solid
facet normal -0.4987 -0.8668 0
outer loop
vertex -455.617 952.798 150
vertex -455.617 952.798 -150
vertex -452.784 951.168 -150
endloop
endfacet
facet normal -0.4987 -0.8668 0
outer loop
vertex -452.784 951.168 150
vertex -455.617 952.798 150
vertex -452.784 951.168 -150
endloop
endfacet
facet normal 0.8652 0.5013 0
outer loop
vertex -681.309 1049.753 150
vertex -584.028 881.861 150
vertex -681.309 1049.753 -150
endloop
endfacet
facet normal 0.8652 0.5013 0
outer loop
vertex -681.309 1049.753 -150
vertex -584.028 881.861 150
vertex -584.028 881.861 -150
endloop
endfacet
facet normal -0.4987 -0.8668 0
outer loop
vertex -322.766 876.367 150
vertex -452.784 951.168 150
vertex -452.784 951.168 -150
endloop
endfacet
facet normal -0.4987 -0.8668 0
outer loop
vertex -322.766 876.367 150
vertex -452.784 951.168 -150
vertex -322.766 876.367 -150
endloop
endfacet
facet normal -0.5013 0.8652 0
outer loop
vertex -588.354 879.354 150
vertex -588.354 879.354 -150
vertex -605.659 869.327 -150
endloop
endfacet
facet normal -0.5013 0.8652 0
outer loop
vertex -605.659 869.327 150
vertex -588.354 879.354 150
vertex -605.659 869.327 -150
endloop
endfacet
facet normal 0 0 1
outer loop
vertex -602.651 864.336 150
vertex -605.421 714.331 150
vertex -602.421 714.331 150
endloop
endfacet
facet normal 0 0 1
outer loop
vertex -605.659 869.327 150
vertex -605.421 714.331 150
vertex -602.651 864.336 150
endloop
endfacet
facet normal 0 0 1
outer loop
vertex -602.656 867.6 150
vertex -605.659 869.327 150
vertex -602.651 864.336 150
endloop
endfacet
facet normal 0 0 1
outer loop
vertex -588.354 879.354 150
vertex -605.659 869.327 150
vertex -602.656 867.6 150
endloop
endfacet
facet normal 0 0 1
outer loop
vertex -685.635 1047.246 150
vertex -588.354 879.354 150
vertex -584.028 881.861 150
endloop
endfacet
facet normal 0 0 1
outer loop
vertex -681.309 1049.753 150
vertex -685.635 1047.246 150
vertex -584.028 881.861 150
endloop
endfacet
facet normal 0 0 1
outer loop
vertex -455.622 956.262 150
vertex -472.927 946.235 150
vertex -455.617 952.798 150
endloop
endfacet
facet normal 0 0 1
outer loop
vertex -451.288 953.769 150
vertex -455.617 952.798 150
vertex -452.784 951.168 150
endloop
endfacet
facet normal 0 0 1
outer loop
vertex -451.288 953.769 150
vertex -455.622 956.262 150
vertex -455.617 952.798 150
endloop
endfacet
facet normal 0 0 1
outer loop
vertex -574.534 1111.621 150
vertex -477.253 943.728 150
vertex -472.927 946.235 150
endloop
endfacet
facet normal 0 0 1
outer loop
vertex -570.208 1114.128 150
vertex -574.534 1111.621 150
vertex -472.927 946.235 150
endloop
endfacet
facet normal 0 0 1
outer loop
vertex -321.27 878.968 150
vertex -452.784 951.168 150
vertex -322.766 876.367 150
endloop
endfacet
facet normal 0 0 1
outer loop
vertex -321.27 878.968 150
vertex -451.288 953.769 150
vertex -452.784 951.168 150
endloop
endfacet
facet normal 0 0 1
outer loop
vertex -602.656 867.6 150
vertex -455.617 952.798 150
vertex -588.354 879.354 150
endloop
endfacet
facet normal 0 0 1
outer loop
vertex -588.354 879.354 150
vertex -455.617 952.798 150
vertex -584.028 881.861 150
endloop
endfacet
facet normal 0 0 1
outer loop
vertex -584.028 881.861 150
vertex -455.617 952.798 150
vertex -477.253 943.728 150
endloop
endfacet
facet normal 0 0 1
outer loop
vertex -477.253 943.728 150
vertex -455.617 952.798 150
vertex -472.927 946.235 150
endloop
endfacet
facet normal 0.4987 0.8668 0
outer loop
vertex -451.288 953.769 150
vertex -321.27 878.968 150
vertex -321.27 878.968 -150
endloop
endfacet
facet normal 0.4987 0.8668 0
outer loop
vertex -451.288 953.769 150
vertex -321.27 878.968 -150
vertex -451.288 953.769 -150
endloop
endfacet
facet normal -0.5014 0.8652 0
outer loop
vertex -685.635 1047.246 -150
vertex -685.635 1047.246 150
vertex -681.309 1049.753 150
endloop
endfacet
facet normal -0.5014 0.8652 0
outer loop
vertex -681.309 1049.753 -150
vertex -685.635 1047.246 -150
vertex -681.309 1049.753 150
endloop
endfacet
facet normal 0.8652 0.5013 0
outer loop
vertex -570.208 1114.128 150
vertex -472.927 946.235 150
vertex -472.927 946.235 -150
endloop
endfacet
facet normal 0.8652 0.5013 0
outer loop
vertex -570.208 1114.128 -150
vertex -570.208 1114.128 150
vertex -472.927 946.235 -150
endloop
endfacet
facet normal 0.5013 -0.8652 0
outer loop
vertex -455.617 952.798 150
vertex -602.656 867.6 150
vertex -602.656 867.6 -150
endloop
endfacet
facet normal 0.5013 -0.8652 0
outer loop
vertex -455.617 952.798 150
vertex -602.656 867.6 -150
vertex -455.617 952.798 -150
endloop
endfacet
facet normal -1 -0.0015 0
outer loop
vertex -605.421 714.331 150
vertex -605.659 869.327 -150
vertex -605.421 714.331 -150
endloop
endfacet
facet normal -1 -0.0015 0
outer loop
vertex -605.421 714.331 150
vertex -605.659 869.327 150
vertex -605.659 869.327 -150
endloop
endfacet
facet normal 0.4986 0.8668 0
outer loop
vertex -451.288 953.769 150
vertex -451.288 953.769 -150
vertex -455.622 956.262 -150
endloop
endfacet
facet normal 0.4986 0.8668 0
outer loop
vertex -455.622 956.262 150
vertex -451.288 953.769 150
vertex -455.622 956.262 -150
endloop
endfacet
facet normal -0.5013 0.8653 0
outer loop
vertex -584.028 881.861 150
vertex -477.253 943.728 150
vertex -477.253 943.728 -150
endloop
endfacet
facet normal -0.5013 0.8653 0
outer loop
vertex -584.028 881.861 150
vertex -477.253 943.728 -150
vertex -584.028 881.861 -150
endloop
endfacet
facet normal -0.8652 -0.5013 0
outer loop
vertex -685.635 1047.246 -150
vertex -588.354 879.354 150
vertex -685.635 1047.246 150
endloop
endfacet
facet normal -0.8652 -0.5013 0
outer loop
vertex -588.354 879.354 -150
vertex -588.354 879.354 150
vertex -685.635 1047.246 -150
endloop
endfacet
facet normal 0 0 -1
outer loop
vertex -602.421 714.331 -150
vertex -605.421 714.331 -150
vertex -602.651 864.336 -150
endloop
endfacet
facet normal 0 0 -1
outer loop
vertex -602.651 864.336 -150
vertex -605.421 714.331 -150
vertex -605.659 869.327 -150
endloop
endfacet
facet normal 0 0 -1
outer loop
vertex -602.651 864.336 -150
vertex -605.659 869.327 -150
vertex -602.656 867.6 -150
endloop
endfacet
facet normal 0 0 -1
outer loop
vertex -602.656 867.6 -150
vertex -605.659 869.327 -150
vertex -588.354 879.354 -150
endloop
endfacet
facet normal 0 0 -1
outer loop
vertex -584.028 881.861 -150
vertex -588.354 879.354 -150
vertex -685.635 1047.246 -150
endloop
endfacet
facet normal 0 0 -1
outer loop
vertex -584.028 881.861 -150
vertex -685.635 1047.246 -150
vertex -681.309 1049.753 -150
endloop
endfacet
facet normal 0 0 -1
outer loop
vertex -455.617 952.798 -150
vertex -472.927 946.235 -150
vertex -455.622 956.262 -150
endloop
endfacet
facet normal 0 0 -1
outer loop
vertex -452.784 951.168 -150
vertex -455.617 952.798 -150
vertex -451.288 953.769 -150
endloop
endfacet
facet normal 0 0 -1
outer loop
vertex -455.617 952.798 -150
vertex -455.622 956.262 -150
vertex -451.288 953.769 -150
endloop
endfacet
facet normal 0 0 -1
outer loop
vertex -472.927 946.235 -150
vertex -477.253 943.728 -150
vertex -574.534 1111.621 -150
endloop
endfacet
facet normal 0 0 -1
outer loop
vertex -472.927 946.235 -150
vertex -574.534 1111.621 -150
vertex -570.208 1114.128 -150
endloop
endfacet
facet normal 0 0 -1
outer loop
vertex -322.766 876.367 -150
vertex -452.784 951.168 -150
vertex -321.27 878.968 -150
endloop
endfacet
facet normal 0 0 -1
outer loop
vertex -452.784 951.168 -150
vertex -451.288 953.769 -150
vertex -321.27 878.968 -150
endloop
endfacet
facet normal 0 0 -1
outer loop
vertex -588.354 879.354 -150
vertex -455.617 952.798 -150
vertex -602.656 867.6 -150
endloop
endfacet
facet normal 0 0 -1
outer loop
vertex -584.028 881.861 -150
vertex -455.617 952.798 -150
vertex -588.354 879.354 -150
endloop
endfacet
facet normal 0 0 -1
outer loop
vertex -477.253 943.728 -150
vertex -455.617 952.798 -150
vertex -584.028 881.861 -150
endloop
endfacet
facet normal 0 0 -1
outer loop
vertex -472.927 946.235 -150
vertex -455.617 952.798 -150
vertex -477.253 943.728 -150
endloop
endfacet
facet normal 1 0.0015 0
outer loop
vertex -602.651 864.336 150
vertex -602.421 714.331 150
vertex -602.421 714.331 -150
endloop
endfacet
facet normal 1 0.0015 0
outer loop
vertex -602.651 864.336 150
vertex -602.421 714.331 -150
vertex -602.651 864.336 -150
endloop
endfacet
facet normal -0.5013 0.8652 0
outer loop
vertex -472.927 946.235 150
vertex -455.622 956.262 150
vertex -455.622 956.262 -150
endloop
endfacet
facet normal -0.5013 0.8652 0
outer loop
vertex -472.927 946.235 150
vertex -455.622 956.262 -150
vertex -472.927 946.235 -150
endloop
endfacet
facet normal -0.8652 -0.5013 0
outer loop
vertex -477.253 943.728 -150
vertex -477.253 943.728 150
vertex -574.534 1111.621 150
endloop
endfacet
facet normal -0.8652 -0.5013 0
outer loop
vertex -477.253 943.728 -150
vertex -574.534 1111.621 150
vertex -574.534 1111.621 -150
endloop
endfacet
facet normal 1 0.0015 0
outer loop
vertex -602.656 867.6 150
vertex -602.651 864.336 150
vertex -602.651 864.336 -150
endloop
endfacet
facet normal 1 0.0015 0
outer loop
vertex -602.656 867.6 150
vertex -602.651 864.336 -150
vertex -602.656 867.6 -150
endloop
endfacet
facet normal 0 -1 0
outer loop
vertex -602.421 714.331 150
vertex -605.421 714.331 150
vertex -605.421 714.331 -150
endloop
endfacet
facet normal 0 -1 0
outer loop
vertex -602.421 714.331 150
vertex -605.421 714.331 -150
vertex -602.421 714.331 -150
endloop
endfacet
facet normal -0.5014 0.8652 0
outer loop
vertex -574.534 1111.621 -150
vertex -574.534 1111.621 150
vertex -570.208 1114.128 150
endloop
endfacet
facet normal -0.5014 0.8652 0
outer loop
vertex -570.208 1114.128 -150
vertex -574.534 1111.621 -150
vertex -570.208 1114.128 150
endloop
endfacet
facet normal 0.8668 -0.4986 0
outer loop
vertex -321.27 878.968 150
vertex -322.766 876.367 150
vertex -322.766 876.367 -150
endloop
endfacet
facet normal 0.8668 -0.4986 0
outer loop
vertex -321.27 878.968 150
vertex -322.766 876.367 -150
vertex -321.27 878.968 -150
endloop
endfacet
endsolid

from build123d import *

# Parameters (mm, degrees)
BOSS_EXTRUDE3_DEPTH = 150
SKETCH3_W           = 5
SKETCH3_H           = 300
BOSS_EXTRUDE4_DEPTH = 194.04


with BuildPart() as part:
    # Sketch1 → Boss-Extrude3 (new, symmetric)
    with BuildSketch(Plane.XY):
        Polygon((-605.658970563, 869.326926327), (-605.421491465, 714.331361266), (-602.421487943, 714.331361266), (-602.651320044, 864.335957761), (-602.656320364, 867.599518288), (-455.616774381, 952.797835671), (-452.784185512, 951.168221277), (-322.765615027, 876.367343414), (-321.26959747, 878.967714824), (-451.288167955, 953.768592687), (-455.622120304, 956.261955282), align=None)
    extrude(amount=BOSS_EXTRUDE3_DEPTH, both=True)

    # Sketch3 → Boss-Extrude4 (add)
    with BuildSketch(Plane(origin=(-529.334093448, 913.551431111, 0), x_dir=(0.8652472150761933, 0.5013454465764019, 0), z_dir=(-0.5013454465764018, 0.8652472150761932, 0))):
        with Locations((62.691806295, 0)):
            Rectangle(SKETCH3_W, SKETCH3_H)
        with Locations((-65.711641465, 0)):
            Rectangle(SKETCH3_W, SKETCH3_H)
    extrude(amount=BOSS_EXTRUDE4_DEPTH)


solid = part.part
